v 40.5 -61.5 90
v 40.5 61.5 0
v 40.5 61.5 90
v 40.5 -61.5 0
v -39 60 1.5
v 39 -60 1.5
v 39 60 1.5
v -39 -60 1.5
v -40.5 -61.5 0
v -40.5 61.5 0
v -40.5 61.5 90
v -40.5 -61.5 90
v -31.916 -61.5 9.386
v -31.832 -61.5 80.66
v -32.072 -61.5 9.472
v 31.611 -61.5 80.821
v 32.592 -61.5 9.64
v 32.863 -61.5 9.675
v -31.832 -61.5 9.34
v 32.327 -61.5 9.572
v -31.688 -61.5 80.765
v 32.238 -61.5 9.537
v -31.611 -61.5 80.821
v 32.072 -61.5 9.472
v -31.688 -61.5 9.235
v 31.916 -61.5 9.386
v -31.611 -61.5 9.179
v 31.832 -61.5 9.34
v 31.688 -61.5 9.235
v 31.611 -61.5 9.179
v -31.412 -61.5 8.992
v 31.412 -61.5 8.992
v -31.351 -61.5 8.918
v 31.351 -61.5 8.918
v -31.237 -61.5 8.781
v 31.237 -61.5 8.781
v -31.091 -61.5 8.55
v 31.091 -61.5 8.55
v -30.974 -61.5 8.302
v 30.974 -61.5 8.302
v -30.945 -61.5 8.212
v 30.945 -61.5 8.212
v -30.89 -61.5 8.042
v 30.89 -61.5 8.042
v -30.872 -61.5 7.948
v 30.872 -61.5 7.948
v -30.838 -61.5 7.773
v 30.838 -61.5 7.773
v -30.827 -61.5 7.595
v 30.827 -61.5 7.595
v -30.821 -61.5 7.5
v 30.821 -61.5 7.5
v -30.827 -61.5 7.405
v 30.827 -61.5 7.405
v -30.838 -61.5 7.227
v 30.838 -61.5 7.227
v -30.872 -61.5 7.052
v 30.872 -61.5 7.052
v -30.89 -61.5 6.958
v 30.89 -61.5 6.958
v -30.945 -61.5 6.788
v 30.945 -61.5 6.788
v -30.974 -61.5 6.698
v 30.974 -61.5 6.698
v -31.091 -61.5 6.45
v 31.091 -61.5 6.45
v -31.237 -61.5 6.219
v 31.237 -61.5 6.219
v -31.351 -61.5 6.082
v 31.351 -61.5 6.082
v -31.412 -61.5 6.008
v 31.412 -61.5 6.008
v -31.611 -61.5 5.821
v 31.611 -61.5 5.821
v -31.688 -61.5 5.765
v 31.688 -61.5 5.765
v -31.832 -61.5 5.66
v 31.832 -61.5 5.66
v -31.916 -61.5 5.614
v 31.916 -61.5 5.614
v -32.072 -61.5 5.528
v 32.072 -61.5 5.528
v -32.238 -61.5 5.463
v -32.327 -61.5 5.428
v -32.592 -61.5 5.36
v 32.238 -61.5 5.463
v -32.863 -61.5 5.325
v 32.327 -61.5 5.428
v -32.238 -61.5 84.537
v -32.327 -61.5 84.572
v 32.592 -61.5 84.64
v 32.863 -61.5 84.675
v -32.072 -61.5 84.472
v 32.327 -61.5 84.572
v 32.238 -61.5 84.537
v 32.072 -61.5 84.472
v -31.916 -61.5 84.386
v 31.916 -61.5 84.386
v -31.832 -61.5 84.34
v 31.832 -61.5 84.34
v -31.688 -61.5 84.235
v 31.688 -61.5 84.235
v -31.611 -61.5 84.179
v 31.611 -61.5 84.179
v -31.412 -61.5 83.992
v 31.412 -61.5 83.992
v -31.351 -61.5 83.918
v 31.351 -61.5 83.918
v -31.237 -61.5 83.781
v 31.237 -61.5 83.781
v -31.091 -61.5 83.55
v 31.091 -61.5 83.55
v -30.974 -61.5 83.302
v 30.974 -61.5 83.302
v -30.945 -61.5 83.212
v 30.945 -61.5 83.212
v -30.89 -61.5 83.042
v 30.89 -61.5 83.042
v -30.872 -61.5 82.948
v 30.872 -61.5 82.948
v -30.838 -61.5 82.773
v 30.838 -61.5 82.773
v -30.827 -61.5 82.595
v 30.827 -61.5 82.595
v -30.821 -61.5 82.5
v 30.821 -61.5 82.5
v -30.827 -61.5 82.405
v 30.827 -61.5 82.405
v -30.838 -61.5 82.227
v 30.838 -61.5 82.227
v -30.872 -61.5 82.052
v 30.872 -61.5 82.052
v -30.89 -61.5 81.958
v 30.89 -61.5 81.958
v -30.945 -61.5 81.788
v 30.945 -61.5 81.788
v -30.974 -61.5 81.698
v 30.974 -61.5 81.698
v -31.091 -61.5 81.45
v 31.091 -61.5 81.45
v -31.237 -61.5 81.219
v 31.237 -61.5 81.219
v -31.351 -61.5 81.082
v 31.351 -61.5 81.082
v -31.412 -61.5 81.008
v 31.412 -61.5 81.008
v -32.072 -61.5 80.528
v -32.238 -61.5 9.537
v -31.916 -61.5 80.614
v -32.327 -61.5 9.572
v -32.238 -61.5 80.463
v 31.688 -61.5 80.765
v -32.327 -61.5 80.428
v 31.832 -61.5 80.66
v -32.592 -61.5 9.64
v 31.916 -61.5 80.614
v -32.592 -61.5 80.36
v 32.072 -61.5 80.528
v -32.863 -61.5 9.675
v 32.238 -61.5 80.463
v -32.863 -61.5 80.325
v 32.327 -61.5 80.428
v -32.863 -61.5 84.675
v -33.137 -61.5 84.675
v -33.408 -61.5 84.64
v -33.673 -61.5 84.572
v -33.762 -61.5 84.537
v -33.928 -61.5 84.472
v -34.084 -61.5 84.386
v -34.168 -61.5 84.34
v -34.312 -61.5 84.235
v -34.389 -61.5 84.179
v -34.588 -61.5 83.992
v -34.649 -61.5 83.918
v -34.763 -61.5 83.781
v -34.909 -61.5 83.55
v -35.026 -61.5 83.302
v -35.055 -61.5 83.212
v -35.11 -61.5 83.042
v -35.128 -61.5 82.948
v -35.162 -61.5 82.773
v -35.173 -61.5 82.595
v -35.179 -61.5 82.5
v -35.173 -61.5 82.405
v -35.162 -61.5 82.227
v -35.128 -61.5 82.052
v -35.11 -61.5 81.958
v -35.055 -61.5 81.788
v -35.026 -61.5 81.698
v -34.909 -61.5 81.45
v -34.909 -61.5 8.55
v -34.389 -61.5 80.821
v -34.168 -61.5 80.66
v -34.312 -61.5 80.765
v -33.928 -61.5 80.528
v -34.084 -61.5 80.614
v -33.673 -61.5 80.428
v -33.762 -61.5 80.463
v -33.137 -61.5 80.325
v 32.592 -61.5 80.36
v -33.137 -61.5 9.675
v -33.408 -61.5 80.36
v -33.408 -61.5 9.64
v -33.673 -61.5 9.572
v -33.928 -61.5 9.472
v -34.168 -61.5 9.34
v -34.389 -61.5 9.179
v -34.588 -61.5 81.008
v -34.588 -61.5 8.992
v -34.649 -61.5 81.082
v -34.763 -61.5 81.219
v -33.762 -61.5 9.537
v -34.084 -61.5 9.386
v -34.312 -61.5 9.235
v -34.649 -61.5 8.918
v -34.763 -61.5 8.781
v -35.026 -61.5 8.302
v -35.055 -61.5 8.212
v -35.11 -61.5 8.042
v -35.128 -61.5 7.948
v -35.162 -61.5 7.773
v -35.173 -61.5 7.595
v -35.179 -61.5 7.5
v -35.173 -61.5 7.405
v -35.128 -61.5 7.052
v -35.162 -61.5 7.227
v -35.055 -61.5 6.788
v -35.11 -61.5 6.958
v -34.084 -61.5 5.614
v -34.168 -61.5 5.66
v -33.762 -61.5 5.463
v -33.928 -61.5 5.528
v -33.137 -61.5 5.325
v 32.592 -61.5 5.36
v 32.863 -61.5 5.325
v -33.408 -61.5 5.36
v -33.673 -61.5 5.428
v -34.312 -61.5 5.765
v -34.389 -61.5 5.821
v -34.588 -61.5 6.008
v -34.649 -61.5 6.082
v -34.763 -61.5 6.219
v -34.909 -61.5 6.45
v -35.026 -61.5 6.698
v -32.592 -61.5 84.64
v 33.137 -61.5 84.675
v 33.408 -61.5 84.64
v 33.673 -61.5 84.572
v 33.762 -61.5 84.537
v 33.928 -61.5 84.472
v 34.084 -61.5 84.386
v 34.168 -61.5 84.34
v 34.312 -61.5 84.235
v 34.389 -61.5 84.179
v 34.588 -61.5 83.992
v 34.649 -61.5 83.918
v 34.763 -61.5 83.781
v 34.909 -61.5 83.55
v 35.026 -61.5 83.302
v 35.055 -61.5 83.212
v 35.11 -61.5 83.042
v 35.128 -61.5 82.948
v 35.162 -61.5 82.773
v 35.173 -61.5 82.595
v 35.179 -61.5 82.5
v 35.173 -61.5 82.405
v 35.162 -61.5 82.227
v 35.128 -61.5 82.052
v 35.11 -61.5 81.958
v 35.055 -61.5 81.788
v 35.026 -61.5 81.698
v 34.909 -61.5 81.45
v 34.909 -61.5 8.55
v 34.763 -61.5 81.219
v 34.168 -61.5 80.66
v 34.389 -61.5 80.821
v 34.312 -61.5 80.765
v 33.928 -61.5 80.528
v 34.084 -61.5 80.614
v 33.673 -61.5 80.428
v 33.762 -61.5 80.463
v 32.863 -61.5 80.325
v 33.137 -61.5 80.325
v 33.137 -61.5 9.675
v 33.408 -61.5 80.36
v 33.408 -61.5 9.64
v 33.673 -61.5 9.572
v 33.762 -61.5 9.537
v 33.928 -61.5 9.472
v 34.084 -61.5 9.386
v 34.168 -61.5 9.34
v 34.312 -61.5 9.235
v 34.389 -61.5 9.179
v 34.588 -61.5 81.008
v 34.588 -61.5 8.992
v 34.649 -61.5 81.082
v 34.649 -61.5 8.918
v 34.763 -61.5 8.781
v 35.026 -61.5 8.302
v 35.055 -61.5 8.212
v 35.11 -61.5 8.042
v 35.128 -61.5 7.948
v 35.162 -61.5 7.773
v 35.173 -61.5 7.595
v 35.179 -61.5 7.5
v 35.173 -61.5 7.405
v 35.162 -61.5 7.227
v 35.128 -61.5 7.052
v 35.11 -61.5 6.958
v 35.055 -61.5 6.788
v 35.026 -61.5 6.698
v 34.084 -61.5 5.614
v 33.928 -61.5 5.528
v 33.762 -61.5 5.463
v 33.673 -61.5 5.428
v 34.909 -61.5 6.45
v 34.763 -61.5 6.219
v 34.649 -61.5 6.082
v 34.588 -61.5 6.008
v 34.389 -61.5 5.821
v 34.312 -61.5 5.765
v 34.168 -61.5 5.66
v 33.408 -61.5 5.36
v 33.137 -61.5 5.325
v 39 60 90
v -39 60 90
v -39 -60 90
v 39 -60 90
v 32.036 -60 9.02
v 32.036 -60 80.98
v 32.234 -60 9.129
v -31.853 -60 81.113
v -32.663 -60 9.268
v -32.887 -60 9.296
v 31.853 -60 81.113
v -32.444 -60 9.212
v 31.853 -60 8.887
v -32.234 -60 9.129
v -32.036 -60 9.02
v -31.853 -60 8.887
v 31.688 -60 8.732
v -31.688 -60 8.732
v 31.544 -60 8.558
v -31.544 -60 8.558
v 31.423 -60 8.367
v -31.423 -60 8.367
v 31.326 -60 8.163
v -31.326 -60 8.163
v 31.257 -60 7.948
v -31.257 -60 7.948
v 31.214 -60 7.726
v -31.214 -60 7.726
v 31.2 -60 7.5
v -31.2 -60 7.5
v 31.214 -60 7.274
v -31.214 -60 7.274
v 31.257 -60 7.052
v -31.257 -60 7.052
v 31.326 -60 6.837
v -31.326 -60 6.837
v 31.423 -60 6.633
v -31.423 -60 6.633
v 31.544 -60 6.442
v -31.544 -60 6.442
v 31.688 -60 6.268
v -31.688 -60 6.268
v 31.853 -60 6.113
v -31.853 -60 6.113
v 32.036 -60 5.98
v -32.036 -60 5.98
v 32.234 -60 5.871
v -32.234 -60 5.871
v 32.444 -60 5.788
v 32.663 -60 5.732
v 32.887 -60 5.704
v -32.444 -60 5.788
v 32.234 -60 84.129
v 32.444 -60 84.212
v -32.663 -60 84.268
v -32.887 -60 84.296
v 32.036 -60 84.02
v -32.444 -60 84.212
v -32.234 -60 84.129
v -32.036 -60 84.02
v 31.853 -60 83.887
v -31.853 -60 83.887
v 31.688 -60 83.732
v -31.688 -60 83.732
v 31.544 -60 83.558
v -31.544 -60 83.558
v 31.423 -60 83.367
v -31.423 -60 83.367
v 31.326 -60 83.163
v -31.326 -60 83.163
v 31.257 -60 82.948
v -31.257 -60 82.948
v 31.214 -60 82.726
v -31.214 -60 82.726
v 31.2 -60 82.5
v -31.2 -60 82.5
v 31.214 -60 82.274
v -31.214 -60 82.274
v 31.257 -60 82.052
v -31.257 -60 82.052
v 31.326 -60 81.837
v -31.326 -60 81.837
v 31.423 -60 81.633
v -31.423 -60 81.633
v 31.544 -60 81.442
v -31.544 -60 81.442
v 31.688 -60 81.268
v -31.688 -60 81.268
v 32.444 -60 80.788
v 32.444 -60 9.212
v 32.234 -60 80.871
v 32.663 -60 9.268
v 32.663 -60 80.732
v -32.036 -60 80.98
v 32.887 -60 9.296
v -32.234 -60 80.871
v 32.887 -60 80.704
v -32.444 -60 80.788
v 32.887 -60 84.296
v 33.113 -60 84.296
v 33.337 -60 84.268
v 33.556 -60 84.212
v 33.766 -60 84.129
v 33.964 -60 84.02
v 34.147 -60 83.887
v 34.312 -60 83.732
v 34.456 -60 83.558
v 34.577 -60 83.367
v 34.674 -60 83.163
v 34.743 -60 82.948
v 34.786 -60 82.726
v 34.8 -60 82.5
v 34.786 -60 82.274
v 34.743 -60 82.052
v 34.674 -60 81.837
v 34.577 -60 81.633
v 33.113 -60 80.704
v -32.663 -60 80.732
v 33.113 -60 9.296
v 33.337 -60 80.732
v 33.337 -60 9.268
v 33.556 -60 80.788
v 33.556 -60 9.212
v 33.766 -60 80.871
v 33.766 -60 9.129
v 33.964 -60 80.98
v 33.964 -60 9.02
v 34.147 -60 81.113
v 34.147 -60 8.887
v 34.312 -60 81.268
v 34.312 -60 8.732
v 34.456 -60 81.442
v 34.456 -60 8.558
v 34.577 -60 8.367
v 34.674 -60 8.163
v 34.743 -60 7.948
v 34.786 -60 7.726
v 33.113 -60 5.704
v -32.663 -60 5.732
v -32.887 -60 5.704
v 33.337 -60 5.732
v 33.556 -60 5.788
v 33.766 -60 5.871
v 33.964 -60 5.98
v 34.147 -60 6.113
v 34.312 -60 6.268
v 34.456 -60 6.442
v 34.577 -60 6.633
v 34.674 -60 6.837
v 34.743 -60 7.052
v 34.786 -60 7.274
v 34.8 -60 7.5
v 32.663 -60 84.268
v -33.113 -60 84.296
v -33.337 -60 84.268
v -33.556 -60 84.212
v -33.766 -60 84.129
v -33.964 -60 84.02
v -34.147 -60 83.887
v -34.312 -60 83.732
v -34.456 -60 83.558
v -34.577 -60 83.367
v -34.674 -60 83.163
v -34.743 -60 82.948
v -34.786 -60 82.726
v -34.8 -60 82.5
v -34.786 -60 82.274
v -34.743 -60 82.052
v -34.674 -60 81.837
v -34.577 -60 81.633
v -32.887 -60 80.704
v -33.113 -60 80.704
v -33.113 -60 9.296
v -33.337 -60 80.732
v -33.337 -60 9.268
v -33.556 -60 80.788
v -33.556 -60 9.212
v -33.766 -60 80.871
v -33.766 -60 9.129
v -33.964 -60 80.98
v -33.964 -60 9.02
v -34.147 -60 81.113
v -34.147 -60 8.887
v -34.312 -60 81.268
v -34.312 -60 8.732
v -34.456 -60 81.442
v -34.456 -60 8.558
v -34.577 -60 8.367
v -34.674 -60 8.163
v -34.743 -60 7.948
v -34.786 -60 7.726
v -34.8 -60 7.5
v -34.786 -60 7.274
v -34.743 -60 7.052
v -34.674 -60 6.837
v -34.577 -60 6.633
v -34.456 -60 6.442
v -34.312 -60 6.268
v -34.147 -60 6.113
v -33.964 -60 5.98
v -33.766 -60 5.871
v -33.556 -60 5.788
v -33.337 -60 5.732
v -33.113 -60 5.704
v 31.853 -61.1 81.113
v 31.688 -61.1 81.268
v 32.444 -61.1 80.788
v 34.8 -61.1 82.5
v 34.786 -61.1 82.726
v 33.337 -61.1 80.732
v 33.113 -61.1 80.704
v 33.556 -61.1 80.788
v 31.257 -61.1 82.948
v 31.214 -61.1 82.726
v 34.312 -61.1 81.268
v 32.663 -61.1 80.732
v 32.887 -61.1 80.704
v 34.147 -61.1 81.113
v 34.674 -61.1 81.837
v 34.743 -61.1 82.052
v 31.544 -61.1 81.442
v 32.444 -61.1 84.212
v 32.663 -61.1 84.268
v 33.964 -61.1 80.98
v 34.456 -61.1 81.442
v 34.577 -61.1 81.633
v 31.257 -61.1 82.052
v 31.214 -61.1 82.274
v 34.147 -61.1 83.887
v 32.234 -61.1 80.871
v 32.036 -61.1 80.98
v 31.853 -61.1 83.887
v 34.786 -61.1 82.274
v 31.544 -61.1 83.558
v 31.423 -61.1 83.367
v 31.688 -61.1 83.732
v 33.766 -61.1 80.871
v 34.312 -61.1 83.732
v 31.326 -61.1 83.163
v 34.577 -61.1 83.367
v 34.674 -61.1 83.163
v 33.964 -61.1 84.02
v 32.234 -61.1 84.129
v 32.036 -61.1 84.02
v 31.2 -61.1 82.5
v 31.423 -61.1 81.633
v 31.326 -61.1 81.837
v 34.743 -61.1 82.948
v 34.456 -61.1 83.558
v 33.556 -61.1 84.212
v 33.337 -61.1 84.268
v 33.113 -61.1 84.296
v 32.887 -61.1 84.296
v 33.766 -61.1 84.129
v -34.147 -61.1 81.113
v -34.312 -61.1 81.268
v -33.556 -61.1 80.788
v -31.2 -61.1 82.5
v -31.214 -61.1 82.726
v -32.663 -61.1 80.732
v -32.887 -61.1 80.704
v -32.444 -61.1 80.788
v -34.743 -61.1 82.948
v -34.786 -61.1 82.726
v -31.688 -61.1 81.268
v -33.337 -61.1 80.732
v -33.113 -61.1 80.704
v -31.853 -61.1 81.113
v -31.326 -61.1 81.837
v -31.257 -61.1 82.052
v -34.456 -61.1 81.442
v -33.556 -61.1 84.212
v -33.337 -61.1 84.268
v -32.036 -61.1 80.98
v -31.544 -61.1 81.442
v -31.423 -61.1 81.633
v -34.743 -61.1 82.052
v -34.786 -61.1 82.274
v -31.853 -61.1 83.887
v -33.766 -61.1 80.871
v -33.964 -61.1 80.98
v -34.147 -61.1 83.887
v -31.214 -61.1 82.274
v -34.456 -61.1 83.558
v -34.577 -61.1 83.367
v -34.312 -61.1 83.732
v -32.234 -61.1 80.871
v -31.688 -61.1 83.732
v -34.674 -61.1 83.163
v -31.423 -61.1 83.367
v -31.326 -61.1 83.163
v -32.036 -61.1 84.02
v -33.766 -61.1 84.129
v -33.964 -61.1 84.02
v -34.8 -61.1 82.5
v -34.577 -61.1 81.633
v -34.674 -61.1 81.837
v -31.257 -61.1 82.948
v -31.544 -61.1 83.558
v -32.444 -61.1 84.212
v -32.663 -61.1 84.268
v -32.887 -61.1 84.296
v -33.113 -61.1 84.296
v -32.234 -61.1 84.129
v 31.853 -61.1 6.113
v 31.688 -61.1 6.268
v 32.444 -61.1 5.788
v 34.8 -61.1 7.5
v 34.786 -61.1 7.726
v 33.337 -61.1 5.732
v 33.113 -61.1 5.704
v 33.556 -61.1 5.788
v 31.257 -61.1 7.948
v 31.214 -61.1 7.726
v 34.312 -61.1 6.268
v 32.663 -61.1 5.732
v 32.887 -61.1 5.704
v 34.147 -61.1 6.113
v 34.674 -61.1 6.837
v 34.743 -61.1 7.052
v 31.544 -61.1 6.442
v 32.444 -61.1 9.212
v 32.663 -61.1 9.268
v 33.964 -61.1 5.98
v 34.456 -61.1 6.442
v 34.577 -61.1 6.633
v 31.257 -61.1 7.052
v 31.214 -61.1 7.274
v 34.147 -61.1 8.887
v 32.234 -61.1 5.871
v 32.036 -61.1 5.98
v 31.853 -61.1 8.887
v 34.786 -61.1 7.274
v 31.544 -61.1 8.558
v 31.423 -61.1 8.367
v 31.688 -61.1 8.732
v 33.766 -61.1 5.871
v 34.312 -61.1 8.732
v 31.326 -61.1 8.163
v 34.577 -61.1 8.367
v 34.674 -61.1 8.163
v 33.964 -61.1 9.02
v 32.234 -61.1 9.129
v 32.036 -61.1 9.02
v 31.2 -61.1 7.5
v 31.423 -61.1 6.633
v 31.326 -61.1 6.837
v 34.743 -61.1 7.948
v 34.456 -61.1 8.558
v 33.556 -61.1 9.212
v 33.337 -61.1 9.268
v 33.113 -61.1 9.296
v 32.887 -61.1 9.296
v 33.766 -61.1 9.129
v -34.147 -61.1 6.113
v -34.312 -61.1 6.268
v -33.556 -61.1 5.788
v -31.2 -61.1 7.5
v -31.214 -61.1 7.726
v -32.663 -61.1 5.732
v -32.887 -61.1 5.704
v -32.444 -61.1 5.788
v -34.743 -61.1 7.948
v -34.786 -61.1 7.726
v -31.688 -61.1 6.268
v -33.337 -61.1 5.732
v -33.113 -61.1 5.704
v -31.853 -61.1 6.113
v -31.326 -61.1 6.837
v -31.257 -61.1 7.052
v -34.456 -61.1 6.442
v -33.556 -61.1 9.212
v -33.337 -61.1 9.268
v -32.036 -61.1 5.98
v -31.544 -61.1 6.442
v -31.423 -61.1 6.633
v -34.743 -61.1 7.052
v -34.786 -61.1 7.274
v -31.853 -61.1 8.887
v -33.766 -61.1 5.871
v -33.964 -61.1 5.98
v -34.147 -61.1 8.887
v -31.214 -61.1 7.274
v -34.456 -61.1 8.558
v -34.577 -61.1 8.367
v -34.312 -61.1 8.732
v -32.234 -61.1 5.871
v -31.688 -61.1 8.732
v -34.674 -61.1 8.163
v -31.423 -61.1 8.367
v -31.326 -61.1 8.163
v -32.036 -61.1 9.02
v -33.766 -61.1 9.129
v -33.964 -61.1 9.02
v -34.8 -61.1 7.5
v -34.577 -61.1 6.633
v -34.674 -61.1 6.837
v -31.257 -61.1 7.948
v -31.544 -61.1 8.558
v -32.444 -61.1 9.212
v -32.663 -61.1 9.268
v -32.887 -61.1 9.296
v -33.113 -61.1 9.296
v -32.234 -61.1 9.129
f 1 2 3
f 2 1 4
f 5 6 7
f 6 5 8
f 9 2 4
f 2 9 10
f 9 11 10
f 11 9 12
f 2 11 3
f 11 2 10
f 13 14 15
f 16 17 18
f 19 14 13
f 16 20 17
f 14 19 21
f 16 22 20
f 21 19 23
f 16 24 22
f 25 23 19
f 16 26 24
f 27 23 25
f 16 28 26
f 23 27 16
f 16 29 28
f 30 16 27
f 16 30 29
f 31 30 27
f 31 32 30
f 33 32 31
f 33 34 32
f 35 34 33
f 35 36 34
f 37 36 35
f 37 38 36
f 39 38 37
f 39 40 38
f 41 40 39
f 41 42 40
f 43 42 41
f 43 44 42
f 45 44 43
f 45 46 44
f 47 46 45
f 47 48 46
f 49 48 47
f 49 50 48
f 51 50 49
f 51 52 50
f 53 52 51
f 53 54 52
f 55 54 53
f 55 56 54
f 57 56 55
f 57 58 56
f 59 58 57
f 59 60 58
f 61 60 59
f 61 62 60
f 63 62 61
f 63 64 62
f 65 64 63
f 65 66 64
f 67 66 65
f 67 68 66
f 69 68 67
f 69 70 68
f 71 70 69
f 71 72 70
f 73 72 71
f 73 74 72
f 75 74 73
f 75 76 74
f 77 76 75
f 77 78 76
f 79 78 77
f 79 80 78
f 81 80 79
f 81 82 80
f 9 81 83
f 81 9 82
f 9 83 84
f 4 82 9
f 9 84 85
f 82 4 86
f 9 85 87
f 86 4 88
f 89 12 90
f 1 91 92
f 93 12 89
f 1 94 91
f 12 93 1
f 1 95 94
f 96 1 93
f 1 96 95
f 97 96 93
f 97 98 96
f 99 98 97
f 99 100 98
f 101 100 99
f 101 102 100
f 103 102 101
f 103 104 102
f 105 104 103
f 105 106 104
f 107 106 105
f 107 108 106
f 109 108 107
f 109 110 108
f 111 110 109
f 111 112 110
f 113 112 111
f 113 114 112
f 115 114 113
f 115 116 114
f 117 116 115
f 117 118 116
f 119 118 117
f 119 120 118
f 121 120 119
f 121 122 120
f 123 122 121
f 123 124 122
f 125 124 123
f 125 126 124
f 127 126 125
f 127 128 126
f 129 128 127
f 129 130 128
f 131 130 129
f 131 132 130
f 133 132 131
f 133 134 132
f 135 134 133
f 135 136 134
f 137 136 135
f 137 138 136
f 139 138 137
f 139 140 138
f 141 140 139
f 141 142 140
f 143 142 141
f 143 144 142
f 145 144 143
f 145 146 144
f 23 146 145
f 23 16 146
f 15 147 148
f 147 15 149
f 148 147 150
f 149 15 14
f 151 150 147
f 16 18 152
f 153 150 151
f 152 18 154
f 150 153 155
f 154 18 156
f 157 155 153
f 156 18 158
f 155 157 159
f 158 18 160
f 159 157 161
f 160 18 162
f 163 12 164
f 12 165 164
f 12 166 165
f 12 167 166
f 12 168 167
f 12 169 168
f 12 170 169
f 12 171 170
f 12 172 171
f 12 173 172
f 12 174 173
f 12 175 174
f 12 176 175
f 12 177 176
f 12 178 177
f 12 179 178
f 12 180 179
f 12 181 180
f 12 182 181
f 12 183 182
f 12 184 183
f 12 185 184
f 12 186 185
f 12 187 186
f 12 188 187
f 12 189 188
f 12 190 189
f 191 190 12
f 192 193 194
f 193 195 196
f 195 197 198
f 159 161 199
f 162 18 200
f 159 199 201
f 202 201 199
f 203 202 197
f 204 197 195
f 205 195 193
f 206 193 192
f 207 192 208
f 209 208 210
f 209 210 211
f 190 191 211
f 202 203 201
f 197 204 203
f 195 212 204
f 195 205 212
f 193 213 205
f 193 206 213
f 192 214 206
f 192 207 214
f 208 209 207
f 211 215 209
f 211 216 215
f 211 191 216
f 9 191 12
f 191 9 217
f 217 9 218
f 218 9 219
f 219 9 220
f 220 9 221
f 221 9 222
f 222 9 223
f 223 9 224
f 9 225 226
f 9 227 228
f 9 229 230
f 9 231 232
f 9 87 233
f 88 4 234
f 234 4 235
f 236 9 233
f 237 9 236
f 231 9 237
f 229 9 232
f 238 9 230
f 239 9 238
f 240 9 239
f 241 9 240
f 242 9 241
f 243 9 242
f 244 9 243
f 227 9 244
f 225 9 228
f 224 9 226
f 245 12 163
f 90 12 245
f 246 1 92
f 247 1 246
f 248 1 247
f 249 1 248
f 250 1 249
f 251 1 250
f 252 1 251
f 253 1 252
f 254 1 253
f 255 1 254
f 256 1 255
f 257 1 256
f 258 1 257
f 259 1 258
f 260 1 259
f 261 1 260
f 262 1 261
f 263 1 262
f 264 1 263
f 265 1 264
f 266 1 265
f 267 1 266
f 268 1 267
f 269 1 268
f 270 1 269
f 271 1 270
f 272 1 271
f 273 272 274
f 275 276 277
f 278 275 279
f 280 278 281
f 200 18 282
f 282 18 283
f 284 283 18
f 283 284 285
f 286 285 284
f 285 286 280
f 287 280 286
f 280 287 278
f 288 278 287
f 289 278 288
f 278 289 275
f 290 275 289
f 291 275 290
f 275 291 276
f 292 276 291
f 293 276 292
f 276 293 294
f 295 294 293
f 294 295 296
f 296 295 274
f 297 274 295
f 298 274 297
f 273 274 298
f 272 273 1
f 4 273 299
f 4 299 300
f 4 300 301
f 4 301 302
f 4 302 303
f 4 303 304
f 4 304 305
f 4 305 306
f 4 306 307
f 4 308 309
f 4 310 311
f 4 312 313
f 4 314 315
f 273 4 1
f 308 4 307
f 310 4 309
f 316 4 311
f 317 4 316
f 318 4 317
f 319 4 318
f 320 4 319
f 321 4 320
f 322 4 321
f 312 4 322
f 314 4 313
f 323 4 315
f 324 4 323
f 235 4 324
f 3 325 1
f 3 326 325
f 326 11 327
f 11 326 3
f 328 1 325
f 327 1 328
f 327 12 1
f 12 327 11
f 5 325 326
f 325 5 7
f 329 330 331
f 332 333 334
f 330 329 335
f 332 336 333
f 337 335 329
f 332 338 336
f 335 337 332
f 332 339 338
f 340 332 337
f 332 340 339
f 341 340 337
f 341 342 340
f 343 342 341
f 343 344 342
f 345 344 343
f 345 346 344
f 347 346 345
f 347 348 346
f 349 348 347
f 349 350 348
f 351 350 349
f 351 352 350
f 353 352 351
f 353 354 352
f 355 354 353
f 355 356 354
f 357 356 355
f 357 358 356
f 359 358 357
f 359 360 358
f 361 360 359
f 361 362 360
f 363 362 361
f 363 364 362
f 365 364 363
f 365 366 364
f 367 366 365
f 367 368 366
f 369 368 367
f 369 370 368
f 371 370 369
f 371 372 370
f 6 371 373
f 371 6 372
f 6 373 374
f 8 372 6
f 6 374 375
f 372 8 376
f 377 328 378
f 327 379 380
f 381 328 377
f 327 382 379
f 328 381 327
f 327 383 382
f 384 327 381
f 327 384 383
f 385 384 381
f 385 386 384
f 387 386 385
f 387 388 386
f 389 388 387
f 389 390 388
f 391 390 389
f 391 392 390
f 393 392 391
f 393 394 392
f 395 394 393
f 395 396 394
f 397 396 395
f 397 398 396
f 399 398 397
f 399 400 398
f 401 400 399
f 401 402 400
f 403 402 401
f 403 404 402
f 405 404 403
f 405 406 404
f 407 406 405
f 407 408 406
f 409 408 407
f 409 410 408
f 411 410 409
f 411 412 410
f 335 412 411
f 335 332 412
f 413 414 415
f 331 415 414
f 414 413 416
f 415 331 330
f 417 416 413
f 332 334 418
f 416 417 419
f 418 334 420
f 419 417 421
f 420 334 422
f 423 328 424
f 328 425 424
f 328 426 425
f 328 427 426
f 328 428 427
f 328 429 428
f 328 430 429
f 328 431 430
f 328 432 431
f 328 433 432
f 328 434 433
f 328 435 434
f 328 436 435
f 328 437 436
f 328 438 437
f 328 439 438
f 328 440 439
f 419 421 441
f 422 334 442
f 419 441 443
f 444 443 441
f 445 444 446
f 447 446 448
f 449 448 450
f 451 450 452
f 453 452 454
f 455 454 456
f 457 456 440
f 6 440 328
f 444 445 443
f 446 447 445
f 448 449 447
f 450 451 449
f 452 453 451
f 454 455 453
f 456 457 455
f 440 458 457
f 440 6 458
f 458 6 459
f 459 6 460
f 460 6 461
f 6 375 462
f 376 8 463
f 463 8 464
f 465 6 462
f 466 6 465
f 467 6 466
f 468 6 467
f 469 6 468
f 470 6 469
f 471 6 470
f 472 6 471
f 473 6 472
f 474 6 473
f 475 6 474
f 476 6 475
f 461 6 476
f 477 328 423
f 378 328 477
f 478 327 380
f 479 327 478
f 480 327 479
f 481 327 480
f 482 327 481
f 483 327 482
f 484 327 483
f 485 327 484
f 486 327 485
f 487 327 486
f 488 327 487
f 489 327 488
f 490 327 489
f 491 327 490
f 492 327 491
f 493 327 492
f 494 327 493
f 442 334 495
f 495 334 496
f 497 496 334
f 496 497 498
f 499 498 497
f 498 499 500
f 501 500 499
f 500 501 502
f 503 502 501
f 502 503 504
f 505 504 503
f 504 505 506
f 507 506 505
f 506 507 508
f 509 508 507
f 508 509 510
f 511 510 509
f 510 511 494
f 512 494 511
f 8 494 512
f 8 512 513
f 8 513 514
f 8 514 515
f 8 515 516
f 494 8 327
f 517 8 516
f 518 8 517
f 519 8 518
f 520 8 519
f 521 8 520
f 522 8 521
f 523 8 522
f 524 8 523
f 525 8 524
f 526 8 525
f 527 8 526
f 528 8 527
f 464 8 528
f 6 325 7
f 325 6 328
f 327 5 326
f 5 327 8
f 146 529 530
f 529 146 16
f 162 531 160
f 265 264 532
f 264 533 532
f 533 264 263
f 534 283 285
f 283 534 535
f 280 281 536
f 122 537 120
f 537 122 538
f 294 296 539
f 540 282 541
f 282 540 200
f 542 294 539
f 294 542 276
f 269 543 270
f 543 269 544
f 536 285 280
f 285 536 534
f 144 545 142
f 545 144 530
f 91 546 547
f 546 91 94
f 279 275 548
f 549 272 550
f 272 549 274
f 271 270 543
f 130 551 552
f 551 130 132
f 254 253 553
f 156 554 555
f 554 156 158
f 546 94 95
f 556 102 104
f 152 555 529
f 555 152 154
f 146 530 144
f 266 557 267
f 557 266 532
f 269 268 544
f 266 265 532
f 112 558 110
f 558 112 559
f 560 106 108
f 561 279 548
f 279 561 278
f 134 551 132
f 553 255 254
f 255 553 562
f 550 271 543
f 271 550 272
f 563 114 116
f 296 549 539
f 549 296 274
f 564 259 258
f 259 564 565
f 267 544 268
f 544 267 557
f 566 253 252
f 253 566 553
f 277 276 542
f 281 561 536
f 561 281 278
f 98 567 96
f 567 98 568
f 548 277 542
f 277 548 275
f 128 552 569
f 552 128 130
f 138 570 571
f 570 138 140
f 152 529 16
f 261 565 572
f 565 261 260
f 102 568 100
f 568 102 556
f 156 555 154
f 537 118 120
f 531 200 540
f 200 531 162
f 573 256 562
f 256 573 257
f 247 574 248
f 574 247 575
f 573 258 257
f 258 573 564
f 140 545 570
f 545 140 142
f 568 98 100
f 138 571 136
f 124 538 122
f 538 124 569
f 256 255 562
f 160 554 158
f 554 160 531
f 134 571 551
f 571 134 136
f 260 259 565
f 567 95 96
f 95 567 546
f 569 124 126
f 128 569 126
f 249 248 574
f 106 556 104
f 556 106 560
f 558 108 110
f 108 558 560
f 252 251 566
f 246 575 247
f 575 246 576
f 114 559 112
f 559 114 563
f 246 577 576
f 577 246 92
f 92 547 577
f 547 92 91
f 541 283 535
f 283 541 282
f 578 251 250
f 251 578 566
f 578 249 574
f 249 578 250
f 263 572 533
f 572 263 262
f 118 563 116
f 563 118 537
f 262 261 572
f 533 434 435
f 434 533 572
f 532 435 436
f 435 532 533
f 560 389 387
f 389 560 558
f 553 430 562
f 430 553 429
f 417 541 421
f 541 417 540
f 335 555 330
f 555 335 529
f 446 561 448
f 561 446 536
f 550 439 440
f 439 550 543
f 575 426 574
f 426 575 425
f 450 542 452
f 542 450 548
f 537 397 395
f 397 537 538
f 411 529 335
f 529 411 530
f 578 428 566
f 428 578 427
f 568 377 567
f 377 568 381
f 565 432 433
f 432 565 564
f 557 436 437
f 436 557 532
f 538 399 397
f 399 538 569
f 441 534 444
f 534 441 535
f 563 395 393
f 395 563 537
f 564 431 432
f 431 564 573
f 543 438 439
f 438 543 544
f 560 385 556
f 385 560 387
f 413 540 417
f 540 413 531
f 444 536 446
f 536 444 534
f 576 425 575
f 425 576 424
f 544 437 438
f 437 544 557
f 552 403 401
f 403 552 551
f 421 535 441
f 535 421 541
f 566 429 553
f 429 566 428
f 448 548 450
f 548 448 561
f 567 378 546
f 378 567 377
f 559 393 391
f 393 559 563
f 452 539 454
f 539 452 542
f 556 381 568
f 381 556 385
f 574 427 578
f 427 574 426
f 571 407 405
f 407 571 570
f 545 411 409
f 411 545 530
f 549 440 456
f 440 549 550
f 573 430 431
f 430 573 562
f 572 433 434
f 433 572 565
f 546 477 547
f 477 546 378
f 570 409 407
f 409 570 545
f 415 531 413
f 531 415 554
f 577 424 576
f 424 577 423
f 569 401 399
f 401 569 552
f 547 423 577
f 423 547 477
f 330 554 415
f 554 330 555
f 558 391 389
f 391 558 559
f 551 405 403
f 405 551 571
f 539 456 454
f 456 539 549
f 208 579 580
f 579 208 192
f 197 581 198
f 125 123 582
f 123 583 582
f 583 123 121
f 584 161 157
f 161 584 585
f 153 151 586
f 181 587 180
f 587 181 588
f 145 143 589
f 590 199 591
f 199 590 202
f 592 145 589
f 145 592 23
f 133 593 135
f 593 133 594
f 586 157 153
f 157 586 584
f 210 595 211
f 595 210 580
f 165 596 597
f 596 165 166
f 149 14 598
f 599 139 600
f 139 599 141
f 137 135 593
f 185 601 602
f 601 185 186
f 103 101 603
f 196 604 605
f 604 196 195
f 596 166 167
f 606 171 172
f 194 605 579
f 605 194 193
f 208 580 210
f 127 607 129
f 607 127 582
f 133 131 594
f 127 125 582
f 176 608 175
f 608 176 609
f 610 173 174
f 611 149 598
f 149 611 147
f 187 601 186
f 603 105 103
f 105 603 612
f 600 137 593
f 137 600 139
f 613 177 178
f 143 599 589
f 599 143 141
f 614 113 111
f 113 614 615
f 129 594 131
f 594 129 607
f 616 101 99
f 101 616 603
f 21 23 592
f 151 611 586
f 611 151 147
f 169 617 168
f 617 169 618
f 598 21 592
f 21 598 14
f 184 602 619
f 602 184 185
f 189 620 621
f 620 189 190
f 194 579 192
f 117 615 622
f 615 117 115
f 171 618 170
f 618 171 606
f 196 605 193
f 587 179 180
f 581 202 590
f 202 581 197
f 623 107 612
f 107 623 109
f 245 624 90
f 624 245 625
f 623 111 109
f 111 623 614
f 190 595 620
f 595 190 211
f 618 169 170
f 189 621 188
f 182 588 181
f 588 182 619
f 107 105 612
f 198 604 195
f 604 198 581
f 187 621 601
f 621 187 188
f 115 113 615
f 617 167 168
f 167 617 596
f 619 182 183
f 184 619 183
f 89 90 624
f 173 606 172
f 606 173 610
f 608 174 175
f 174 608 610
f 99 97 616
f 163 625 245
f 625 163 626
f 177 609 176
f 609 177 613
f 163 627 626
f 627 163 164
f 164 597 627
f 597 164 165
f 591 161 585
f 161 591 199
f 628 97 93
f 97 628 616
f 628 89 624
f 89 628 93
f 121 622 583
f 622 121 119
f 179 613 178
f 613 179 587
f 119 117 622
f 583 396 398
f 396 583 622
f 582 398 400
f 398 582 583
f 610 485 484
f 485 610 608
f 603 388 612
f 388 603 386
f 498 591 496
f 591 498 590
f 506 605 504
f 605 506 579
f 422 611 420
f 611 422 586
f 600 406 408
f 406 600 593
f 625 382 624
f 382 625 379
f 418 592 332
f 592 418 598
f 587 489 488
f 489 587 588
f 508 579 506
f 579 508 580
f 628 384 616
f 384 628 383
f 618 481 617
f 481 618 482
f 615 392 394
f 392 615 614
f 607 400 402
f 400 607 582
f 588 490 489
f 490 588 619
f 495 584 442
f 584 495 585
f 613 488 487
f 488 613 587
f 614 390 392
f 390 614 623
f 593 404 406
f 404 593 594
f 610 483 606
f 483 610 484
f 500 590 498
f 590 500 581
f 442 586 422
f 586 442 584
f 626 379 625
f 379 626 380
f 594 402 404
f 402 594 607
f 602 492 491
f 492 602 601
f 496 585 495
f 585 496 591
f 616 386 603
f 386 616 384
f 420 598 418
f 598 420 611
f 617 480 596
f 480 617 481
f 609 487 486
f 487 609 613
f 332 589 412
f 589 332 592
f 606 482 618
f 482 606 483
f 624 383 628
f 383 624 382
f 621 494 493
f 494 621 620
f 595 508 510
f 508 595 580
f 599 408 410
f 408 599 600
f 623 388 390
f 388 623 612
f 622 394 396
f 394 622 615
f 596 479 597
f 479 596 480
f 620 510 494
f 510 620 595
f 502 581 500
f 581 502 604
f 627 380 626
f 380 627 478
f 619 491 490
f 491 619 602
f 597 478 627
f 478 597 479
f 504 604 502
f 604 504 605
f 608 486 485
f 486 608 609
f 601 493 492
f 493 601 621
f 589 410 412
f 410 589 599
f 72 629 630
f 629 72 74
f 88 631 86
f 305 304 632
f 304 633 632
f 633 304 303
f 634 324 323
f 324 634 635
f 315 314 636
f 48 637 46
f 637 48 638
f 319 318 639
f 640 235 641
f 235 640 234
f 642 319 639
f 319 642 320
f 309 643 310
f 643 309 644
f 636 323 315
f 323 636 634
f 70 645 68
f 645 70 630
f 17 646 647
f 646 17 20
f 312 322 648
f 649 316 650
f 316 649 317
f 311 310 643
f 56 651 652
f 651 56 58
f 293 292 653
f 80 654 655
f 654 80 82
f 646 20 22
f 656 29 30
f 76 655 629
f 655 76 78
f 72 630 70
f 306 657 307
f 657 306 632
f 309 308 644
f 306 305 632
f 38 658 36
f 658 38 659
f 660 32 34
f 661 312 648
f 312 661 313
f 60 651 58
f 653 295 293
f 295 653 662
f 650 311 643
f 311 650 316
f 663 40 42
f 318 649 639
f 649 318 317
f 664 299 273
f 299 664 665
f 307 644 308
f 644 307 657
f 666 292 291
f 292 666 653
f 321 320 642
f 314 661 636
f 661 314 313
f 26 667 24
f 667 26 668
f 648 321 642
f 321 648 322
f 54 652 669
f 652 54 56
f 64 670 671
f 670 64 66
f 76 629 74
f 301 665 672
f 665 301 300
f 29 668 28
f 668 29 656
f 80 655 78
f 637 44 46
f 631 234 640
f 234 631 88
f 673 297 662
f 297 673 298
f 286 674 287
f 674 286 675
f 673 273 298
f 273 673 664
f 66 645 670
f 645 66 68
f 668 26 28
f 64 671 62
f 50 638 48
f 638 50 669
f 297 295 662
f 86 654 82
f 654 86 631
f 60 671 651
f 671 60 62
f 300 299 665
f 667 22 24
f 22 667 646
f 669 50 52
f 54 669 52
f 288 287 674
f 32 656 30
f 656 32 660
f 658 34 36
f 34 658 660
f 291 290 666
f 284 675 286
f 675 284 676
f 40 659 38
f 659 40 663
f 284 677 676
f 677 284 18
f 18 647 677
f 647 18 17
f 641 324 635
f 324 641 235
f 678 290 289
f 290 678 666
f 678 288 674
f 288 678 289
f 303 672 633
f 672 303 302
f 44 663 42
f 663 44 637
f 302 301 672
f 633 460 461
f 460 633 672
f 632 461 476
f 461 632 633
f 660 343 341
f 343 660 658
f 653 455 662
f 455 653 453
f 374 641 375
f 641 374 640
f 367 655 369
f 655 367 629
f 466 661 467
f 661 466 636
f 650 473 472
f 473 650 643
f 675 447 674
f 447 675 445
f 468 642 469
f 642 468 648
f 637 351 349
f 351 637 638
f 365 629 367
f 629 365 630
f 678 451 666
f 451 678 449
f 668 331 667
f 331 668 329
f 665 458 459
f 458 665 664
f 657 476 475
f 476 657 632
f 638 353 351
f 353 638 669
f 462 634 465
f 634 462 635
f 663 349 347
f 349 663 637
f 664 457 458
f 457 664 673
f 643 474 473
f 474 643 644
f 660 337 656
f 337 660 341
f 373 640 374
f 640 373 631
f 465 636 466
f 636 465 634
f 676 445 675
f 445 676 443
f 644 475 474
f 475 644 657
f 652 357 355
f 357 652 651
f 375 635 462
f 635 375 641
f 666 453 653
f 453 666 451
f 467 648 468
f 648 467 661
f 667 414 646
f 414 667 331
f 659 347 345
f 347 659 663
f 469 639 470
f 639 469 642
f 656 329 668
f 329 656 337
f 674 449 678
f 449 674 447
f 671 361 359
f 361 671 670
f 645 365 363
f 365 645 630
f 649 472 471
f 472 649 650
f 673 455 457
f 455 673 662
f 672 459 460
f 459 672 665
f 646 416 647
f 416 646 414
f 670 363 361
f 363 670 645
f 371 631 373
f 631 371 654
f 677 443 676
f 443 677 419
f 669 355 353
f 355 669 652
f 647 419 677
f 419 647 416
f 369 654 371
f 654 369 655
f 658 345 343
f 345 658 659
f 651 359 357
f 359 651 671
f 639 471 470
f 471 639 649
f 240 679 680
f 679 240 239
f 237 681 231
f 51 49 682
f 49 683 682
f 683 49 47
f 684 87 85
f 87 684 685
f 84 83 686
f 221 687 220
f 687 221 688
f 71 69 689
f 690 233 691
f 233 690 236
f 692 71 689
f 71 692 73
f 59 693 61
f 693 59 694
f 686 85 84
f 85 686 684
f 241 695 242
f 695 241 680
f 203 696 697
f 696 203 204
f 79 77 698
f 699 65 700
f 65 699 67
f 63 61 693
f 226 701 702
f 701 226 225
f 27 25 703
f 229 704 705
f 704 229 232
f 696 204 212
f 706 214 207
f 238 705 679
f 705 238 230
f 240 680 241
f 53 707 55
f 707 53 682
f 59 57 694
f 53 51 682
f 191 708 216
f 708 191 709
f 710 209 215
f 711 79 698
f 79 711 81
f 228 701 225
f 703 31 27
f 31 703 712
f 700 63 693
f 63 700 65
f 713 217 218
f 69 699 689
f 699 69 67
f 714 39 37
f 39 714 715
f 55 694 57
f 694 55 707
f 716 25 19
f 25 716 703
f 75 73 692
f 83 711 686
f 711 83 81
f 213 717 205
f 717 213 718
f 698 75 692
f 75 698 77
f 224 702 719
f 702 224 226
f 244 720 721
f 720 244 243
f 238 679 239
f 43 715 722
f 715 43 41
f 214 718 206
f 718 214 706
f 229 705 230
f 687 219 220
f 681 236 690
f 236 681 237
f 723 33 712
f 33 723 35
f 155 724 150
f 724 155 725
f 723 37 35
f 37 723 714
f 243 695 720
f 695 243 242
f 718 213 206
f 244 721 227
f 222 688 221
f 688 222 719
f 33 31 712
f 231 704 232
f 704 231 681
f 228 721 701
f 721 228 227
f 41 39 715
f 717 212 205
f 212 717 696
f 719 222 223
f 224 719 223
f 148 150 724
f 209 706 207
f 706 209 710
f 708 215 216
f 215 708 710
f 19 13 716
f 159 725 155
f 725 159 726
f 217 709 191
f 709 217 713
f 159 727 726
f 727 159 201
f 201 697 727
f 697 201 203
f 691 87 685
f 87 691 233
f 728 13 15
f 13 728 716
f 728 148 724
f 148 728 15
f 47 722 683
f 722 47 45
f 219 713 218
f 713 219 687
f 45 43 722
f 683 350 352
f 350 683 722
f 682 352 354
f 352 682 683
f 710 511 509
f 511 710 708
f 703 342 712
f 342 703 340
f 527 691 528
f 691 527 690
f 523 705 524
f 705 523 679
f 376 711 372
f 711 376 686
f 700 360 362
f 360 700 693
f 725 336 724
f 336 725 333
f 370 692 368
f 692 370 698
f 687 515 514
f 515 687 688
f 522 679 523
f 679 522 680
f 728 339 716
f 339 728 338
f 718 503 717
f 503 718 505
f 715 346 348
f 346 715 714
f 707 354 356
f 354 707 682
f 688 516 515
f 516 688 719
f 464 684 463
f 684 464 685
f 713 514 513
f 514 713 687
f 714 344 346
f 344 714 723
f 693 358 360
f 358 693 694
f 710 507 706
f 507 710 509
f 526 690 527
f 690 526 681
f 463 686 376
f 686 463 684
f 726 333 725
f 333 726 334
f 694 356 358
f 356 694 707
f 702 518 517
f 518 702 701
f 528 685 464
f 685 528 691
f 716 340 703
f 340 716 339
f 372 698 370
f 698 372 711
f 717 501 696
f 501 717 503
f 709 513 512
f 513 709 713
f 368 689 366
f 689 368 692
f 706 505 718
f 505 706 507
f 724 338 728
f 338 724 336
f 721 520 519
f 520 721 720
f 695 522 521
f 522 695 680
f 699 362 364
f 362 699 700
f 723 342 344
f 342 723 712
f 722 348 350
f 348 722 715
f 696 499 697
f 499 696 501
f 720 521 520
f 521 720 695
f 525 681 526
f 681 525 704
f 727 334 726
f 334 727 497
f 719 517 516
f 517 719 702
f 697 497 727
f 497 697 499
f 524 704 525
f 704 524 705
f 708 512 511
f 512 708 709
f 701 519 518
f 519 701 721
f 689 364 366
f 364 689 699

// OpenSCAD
$fn = 50;


difference() {
	union() {
		translate(v = [-40.5000000000, -61.5000000000, 0]) {
			cube(size = [81, 123, 1.5000000000]);
		}
		translate(v = [-40.5000000000, 60.0000000000, 0]) {
			cube(size = [81, 1.5000000000, 90]);
		}
		translate(v = [-40.5000000000, -61.5000000000, 0]) {
			cube(size = [81, 1.5000000000, 90]);
		}
		translate(v = [39.0000000000, -61.5000000000, 0]) {
			cube(size = [1.5000000000, 123, 90]);
		}
		translate(v = [-40.5000000000, -61.5000000000, 0]) {
			cube(size = [1.5000000000, 123, 90]);
		}
	}
	union() {
		translate(v = [33.0000000000, -63.0000000000, 82.5000000000]) {
			rotate(a = [90, 0, 0]) {
				difference() {
					union() {
						#translate(v = [0, 0, -15.0000000000]) {
							cylinder(h = 15, r = 1.5000000000);
						}
						#translate(v = [0, 0, -1.9000000000]) {
							cylinder(h = 1.9000000000, r1 = 1.8000000000, r2 = 3.6000000000);
						}
						#translate(v = [0, 0, -15.0000000000]) {
							cylinder(h = 15, r = 1.8000000000);
						}
						#translate(v = [0, 0, -15.0000000000]) {
							cylinder(h = 15, r = 1.5000000000);
						}
					}
					union();
				}
			}
		}
		translate(v = [-33.0000000000, -63.0000000000, 82.5000000000]) {
			rotate(a = [90, 0, 0]) {
				difference() {
					union() {
						#translate(v = [0, 0, -15.0000000000]) {
							cylinder(h = 15, r = 1.5000000000);
						}
						#translate(v = [0, 0, -1.9000000000]) {
							cylinder(h = 1.9000000000, r1 = 1.8000000000, r2 = 3.6000000000);
						}
						#translate(v = [0, 0, -15.0000000000]) {
							cylinder(h = 15, r = 1.8000000000);
						}
						#translate(v = [0, 0, -15.0000000000]) {
							cylinder(h = 15, r = 1.5000000000);
						}
					}
					union();
				}
			}
		}
		translate(v = [33.0000000000, -63.0000000000, 7.5000000000]) {
			rotate(a = [90, 0, 0]) {
				difference() {
					union() {
						#translate(v = [0, 0, -15.0000000000]) {
							cylinder(h = 15, r = 1.5000000000);
						}
						#translate(v = [0, 0, -1.9000000000]) {
							cylinder(h = 1.9000000000, r1 = 1.8000000000, r2 = 3.6000000000);
						}
						#translate(v = [0, 0, -15.0000000000]) {
							cylinder(h = 15, r = 1.8000000000);
						}
						#translate(v = [0, 0, -15.0000000000]) {
							cylinder(h = 15, r = 1.5000000000);
						}
					}
					union();
				}
			}
		}
		translate(v = [-33.0000000000, -63.0000000000, 7.5000000000]) {
			rotate(a = [90, 0, 0]) {
				difference() {
					union() {
						#translate(v = [0, 0, -15.0000000000]) {
							cylinder(h = 15, r = 1.5000000000);
						}
						#translate(v = [0, 0, -1.9000000000]) {
							cylinder(h = 1.9000000000, r1 = 1.8000000000, r2 = 3.6000000000);
						}
						#translate(v = [0, 0, -15.0000000000]) {
							cylinder(h = 15, r = 1.8000000000);
						}
						#translate(v = [0, 0, -15.0000000000]) {
							cylinder(h = 15, r = 1.5000000000);
						}
					}
					union();
				}
			}
		}
	}
}
